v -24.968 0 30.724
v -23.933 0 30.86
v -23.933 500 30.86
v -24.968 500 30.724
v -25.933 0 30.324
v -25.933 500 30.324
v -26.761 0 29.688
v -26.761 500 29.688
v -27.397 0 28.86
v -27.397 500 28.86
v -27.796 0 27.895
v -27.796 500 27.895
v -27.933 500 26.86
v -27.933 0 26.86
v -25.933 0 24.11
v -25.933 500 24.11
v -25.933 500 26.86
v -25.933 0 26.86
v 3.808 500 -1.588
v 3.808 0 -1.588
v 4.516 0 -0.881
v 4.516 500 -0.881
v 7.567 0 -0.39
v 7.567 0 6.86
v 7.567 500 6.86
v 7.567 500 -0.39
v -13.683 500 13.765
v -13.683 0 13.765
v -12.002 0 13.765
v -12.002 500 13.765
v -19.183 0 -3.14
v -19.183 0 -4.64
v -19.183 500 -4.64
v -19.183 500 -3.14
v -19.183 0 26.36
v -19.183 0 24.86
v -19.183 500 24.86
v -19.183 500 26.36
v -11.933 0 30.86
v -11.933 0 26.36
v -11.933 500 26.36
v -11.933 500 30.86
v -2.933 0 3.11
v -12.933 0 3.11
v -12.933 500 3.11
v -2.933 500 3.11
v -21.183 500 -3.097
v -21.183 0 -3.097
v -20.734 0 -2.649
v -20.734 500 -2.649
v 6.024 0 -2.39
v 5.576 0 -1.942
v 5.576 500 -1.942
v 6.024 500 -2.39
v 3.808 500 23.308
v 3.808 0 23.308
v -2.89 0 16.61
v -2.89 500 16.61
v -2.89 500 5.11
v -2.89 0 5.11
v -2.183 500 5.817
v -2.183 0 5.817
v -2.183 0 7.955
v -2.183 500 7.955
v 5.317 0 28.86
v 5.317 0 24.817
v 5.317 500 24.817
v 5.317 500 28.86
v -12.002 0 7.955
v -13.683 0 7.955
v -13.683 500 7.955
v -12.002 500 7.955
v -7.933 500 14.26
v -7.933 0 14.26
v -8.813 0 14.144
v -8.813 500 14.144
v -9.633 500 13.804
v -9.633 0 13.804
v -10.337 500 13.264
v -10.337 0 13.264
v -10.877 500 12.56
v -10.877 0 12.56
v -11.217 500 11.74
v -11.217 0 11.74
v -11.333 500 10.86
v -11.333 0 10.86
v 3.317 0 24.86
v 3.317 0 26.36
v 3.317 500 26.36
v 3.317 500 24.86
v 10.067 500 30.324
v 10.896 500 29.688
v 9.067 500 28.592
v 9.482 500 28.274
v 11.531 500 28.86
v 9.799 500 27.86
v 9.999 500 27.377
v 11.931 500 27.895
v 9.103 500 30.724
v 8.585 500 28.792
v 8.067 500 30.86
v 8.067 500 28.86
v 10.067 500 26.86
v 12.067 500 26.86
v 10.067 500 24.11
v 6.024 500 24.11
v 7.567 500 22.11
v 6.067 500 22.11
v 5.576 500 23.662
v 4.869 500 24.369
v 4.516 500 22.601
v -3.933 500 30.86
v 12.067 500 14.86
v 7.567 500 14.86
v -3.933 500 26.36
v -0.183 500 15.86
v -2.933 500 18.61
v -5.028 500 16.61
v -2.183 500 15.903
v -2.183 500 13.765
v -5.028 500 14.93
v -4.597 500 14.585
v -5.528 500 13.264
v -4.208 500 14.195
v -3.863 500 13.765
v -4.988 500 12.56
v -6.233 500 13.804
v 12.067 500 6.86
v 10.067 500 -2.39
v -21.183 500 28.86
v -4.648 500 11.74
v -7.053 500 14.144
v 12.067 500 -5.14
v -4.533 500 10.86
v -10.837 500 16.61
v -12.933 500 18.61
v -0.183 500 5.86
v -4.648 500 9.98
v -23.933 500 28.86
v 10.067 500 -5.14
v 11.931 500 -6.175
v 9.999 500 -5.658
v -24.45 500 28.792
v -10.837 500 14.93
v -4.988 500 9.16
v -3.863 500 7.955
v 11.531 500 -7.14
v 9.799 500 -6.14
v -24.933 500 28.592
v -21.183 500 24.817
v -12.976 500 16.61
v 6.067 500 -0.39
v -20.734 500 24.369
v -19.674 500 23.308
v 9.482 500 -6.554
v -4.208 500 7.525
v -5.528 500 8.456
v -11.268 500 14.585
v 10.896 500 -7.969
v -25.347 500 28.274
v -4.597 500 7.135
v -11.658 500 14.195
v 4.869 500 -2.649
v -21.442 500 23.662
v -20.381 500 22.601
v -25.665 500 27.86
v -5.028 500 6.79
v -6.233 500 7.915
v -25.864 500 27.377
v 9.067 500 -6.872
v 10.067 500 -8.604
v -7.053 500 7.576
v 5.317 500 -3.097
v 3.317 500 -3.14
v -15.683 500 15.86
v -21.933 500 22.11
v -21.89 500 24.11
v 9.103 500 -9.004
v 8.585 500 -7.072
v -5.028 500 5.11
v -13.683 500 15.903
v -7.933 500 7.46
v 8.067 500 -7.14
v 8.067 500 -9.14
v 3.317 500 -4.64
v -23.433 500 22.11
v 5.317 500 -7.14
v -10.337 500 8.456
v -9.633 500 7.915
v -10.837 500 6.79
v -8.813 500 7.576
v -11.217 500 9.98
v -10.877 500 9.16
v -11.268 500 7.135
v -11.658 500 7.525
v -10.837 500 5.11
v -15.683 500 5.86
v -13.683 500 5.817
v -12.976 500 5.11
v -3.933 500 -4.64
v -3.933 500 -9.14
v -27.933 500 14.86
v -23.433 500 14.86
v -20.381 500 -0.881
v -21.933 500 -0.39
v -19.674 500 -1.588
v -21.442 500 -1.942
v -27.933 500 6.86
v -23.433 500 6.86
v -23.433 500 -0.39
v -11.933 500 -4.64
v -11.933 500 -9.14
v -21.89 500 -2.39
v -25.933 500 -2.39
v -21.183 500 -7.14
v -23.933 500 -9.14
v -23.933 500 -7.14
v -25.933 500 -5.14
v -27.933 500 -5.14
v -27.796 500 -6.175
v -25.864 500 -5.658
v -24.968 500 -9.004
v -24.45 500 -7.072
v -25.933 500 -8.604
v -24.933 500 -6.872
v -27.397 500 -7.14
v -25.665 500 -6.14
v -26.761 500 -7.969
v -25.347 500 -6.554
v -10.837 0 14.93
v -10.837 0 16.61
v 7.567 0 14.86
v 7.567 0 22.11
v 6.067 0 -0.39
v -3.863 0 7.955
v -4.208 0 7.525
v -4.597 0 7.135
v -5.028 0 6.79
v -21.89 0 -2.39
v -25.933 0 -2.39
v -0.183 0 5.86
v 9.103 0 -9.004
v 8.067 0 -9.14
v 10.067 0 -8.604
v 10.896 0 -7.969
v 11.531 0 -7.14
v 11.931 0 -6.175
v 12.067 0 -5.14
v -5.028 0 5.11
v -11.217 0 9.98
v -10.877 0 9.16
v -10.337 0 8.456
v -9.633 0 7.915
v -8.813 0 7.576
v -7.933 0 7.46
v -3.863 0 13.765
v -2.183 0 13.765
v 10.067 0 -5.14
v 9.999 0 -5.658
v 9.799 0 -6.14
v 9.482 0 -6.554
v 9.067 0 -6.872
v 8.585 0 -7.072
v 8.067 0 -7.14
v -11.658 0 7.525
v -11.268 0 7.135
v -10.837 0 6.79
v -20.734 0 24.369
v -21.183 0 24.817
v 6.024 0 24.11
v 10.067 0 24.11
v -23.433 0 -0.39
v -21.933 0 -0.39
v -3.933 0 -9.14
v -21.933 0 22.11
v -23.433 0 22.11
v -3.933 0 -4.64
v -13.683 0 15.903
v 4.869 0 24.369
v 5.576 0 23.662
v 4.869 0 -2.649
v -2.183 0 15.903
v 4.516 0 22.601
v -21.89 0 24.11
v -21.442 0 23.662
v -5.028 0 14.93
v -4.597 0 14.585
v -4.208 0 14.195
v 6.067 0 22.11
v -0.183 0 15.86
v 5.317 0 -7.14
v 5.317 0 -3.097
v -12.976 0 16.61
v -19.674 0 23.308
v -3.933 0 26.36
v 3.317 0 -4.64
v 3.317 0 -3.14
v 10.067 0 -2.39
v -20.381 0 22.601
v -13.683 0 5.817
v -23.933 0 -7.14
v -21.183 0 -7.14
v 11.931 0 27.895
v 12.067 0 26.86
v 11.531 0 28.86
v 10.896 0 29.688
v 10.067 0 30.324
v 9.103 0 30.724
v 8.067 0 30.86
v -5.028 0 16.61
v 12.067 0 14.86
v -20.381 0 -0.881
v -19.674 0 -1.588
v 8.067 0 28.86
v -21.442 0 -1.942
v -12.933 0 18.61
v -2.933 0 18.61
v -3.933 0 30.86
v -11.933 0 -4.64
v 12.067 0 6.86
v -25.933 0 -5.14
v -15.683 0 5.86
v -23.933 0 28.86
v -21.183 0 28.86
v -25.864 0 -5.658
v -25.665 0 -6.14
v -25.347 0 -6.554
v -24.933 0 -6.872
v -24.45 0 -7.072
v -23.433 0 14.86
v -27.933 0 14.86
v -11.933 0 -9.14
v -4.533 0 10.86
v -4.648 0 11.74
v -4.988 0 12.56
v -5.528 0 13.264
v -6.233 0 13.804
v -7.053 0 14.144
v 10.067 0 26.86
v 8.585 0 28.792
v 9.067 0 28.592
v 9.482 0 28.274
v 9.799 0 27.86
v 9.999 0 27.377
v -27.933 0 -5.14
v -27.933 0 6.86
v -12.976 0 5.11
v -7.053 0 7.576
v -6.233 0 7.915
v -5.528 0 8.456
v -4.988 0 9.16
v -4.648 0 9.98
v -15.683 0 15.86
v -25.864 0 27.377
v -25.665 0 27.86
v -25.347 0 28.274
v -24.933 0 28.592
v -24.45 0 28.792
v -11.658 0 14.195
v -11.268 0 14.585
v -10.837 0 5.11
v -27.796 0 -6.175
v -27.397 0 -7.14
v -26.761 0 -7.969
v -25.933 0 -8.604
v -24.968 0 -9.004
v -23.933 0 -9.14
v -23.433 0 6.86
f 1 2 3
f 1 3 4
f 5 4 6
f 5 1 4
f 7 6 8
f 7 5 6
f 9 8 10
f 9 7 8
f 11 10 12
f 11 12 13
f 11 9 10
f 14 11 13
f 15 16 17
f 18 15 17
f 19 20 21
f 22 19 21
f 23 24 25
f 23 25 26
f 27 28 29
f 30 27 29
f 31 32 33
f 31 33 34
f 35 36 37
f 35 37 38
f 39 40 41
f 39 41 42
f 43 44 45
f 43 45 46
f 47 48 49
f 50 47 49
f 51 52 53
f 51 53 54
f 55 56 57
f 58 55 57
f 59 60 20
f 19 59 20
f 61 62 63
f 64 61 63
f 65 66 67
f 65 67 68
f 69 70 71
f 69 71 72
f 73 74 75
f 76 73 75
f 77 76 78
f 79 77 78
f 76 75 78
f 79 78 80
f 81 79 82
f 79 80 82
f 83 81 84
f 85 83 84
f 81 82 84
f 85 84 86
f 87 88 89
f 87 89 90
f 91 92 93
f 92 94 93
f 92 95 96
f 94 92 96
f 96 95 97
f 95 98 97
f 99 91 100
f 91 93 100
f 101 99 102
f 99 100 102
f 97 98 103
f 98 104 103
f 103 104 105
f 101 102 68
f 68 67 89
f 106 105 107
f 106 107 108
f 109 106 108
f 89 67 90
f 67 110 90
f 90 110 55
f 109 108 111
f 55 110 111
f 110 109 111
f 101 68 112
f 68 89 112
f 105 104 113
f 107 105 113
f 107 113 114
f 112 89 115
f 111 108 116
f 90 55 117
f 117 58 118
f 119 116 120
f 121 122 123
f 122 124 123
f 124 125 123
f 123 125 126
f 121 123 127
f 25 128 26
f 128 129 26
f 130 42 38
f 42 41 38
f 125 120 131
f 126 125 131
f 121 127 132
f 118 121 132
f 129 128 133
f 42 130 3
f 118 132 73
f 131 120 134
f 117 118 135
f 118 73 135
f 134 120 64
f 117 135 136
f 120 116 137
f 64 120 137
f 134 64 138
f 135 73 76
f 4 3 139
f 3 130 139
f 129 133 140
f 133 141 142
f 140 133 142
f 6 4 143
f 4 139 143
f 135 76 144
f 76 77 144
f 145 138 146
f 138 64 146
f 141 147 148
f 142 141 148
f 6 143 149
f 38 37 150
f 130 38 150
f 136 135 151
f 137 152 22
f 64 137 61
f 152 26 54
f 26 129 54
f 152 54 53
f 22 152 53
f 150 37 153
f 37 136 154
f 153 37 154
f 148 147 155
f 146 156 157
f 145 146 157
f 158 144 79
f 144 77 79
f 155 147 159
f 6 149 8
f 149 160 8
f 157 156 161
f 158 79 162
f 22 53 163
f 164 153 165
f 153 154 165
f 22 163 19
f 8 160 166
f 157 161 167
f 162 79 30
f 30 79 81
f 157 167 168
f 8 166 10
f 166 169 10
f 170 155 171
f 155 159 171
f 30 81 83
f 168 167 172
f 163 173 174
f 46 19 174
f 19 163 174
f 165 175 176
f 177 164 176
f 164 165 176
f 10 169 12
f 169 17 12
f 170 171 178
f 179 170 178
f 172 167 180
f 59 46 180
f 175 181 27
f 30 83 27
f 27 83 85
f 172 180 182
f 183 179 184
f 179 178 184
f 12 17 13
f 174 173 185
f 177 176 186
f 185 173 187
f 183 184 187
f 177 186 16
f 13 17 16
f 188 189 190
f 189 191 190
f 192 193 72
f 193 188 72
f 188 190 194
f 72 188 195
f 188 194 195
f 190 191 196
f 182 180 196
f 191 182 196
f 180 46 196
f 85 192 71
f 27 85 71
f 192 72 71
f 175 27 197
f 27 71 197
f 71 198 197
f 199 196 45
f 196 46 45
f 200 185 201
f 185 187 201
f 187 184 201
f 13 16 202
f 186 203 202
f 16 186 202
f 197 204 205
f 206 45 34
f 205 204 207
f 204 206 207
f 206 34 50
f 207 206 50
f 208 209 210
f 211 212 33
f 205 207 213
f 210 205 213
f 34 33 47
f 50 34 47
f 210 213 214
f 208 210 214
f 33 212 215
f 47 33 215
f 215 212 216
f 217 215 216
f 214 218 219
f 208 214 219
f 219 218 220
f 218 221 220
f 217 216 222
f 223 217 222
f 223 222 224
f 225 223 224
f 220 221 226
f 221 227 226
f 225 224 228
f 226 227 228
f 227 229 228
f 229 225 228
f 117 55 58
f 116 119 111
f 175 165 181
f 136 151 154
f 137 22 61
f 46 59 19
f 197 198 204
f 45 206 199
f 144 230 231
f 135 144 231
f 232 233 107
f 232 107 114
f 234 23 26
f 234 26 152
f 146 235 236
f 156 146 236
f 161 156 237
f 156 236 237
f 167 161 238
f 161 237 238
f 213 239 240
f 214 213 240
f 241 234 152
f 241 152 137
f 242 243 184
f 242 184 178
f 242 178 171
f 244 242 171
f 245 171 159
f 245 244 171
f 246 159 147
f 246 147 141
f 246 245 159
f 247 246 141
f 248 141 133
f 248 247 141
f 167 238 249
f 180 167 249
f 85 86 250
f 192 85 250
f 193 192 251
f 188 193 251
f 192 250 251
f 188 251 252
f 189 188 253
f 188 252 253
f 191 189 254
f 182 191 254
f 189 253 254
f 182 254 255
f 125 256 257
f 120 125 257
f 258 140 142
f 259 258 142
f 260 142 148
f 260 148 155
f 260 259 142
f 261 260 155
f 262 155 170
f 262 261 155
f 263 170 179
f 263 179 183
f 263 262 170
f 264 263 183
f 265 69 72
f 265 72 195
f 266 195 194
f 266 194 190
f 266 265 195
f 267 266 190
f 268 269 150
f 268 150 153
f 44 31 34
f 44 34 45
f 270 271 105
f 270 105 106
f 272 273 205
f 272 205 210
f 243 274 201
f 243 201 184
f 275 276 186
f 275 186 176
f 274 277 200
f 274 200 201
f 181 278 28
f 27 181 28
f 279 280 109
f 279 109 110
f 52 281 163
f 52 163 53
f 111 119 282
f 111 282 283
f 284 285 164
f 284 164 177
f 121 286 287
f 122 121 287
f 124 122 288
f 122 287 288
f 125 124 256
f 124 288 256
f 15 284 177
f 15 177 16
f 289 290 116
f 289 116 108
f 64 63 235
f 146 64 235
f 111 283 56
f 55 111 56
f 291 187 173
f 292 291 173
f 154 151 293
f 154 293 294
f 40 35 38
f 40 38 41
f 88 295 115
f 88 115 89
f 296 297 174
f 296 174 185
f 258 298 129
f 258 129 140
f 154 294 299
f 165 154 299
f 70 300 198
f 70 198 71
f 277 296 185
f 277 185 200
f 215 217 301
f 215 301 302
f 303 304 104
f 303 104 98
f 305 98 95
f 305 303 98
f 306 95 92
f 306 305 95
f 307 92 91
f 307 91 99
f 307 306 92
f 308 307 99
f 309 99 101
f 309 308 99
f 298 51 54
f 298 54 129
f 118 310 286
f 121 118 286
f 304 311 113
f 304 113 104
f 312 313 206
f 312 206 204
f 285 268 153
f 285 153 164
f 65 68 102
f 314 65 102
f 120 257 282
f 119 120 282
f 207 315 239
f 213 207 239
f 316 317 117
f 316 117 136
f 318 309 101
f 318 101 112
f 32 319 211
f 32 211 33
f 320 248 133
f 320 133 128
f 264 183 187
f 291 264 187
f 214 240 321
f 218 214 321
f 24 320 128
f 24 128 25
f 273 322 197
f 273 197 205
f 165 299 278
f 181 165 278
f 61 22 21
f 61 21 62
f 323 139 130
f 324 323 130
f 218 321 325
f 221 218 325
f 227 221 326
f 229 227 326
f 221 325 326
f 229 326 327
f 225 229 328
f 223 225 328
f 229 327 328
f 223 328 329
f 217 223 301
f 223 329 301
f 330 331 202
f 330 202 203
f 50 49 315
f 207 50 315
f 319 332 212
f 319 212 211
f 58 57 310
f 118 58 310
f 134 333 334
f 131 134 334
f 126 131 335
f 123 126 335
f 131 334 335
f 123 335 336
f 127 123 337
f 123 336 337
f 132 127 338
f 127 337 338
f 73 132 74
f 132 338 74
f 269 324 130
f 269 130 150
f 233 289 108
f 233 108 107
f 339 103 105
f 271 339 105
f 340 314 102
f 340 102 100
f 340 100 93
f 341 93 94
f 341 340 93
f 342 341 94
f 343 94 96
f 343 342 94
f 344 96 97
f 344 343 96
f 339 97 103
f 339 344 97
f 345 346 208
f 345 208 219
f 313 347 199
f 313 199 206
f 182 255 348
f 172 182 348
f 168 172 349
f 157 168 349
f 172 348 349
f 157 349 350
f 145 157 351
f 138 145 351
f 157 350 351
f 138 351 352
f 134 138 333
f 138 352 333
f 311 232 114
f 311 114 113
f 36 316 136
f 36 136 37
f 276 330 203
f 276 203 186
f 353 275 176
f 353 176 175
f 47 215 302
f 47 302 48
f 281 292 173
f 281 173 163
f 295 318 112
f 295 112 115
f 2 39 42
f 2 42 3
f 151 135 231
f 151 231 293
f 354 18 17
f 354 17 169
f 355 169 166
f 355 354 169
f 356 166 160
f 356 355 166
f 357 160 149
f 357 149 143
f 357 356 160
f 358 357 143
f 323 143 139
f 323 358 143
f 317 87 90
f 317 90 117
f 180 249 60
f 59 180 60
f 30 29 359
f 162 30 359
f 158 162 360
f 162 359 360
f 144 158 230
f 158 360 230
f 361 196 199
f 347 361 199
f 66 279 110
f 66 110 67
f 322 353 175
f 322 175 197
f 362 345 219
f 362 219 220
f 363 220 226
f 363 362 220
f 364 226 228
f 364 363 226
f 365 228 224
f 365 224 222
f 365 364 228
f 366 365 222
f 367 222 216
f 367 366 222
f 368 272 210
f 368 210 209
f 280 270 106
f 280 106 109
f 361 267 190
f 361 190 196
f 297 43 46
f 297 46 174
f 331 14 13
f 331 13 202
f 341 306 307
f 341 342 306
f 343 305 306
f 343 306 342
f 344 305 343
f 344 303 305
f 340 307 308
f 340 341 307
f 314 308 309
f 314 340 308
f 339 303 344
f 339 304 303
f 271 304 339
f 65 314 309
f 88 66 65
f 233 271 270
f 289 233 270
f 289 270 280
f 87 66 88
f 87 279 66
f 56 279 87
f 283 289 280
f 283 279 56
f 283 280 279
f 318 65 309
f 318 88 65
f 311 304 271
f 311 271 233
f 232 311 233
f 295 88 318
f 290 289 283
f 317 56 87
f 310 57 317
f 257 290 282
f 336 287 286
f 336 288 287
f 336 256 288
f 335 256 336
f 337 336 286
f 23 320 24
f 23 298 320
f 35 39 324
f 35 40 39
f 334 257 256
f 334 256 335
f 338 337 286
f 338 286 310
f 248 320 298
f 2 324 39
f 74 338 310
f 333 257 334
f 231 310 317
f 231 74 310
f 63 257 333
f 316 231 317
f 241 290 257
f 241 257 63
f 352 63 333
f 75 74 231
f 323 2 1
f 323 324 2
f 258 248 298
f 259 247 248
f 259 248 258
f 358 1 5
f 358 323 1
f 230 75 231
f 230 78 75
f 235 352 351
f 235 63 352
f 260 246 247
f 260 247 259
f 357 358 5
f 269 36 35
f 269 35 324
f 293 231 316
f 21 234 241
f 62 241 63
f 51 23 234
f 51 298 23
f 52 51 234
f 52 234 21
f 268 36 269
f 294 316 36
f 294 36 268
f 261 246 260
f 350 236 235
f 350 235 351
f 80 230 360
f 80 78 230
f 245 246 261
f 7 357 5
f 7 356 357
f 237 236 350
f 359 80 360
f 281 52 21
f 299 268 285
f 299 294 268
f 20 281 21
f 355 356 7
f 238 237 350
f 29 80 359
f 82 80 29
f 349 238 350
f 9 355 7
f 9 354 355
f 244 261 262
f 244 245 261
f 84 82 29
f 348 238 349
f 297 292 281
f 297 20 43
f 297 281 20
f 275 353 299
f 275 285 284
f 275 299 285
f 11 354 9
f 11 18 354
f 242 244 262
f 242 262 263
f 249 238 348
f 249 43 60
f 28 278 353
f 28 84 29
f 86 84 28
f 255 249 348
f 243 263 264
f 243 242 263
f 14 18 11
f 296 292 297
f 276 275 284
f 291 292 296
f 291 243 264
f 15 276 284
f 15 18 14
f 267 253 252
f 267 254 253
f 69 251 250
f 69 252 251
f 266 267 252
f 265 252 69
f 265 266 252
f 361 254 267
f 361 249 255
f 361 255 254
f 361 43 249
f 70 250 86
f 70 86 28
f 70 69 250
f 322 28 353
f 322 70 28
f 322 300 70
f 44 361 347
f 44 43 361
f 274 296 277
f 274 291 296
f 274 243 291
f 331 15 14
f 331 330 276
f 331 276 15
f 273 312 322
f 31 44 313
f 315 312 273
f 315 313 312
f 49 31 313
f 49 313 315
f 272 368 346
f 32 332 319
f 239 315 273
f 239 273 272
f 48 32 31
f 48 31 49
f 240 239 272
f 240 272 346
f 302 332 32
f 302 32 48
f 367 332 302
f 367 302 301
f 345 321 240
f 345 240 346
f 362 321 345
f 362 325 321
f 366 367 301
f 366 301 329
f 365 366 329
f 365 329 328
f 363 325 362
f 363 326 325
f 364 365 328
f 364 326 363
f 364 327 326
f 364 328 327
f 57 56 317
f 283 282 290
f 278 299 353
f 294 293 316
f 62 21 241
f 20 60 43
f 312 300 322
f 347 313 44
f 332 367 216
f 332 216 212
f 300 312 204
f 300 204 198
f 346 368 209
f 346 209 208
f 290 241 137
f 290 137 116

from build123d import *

# Parameters (mm, degrees)
BOSS_EXTRUDE1_DEPTH = 500


with BuildPart() as part:
    # Sketch1 → Boss-Extrude1 (new body)
    with BuildSketch(Plane(origin=(0, 0, 0), x_dir=(1, 0, 0), z_dir=(0, 1, 0))):
        with BuildLine():
            Line((-27.932618907, -6.859852703), (-27.932618907, 5.140147297))
            ThreePointArc((-27.932618907, 5.140147297), (-26.761046031, 7.968574422), (-23.932618907, 9.140147297))
            Line((-23.932618907, 9.140147297), (-11.932618907, 9.140147297))
            Line((-11.932618907, 9.140147297), (-11.932618907, 4.640147297))
            Line((-11.932618907, 4.640147297), (-19.182618907, 4.640147297))
            Line((-19.182618907, 4.640147297), (-19.182618907, 3.140147297))
            Line((-19.182618907, 3.140147297), (-12.932618907, -3.109852703))
            Line((-12.932618907, -3.109852703), (-7.932618907, -3.109852703))
            Line((-7.932618907, -3.109852703), (-2.932618907, -3.109852703))
            Line((-2.932618907, -3.109852703), (3.317381093, 3.140147297))
            Line((3.317381093, 3.140147297), (3.317381093, 4.640147297))
            Line((3.317381093, 4.640147297), (-3.932618907, 4.640147297))
            Line((-3.932618907, 4.640147297), (-3.932618907, 9.140147297))
            Line((-3.932618907, 9.140147297), (8.067381093, 9.140147297))
            ThreePointArc((8.067381093, 9.140147297), (10.895808218, 7.968574422), (12.067381093, 5.140147297))
            Line((12.067381093, 5.140147297), (12.067381093, -6.859852703))
            Line((12.067381093, -6.859852703), (7.567381093, -6.859852703))
            Line((7.567381093, -6.859852703), (7.567381093, 0.390147297))
            Line((7.567381093, 0.390147297), (6.067381093, 0.390147297))
            Line((6.067381093, 0.390147297), (-0.182618907, -5.859852703))
            Line((-0.182618907, -5.859852703), (-0.182618907, -10.859852703))
            Line((-0.182618907, -10.859852703), (-0.182618907, -15.859852703))
            Line((-0.182618907, -15.859852703), (6.067381093, -22.109852703))
            Line((6.067381093, -22.109852703), (7.567381093, -22.109852703))
            Line((7.567381093, -22.109852703), (7.567381093, -14.859852703))
            Line((7.567381093, -14.859852703), (12.067381093, -14.859852703))
            Line((12.067381093, -14.859852703), (12.067381093, -26.859852703))
            ThreePointArc((12.067381093, -26.859852703), (10.895808218, -29.688279827), (8.067381093, -30.859852703))
            Line((8.067381093, -30.859852703), (-3.932618907, -30.859852703))
            Line((-3.932618907, -30.859852703), (-3.932618907, -26.359852703))
            Line((-3.932618907, -26.359852703), (3.317381093, -26.359852703))
            Line((3.317381093, -26.359852703), (3.317381093, -24.859852703))
            Line((3.317381093, -24.859852703), (-2.932618907, -18.609852703))
            Line((-2.932618907, -18.609852703), (-7.932618907, -18.609852703))
            Line((-7.932618907, -18.609852703), (-12.932618907, -18.609852703))
            Line((-12.932618907, -18.609852703), (-19.182618907, -24.859852703))
            Line((-19.182618907, -24.859852703), (-19.182618907, -26.359852703))
            Line((-19.182618907, -26.359852703), (-11.932618907, -26.359852703))
            Line((-11.932618907, -26.359852703), (-11.932618907, -30.859852703))
            Line((-11.932618907, -30.859852703), (-23.932618907, -30.859852703))
            ThreePointArc((-23.932618907, -30.859852703), (-26.761046031, -29.688279827), (-27.932618907, -26.859852703))
            Line((-27.932618907, -26.859852703), (-27.932618907, -14.859852703))
            Line((-27.932618907, -14.859852703), (-23.432618907, -14.859852703))
            Line((-23.432618907, -14.859852703), (-23.432618907, -22.109852703))
            Line((-23.432618907, -22.109852703), (-21.932618907, -22.109852703))
            Line((-21.932618907, -22.109852703), (-15.682618907, -15.859852703))
            Line((-15.682618907, -15.859852703), (-15.682618907, -10.859852703))
            Line((-15.682618907, -10.859852703), (-15.682618907, -5.859852703))
            Line((-15.682618907, -5.859852703), (-21.932618907, 0.390147297))
            Line((-21.932618907, 0.390147297), (-23.432618907, 0.390147297))
            Line((-23.432618907, 0.390147297), (-23.432618907, -6.859852703))
            Line((-23.432618907, -6.859852703), (-27.932618907, -6.859852703))
        make_face()
        with BuildLine():
            Line((-25.932618907, 2.390147297), (-25.932618907, 5.140147297))
            ThreePointArc((-25.932618907, 5.140147297), (-25.346832469, 6.55436086), (-23.932618907, 7.140147297))
            Line((-23.932618907, 7.140147297), (-21.182618907, 7.140147297))
            Line((-21.182618907, 7.140147297), (-21.182618907, 3.097254079))
            Line((-21.182618907, 3.097254079), (-20.734395602, 2.649030774))
            Line((-20.734395602, 2.649030774), (-21.441502383, 1.941923993))
            Line((-21.441502383, 1.941923993), (-21.889725688, 2.390147297))
            Line((-21.889725688, 2.390147297), (-25.932618907, 2.390147297))
        make_face(mode=Mode.SUBTRACT)
        with BuildLine():
            Line((-20.380842211, 0.881263821), (-13.682618907, -5.816959484))
            Line((-13.682618907, -5.816959484), (-13.682618907, -7.955115193))
            Line((-13.682618907, -7.955115193), (-13.182618907, -7.955115193))
            Line((-13.182618907, -7.955115193), (-12.002324056, -7.955115193))
            ThreePointArc((-12.002324056, -7.955115193), (-11.468152813, -7.324318797), (-10.837356416, -6.790147554))
            Line((-10.837356416, -6.790147554), (-10.837356416, -5.609852703))
            Line((-10.837356416, -5.609852703), (-10.837356416, -5.109852703))
            Line((-10.837356416, -5.109852703), (-12.975512126, -5.109852703))
            Line((-12.975512126, -5.109852703), (-19.67373543, 1.588370602))
            Line((-19.67373543, 1.588370602), (-20.380842211, 0.881263821))
        make_face(mode=Mode.SUBTRACT)
        with BuildLine():
            Line((10.067381093, 2.390147297), (10.067381093, 5.140147297))
            ThreePointArc((10.067381093, 5.140147297), (9.481594656, 6.55436086), (8.067381093, 7.140147297))
            Line((8.067381093, 7.140147297), (5.317381093, 7.140147297))
            Line((5.317381093, 7.140147297), (5.317381093, 3.097254079))
            Line((5.317381093, 3.097254079), (4.869157789, 2.649030774))
            Line((4.869157789, 2.649030774), (5.57626457, 1.941923993))
            Line((5.57626457, 1.941923993), (6.024487874, 2.390147297))
            Line((6.024487874, 2.390147297), (10.067381093, 2.390147297))
        make_face(mode=Mode.SUBTRACT)
        with BuildLine():
            Line((-2.182618907, -5.816959484), (-2.182618907, -7.955115193))
            Line((-2.182618907, -7.955115193), (-2.682618907, -7.955115193))
            Line((-2.682618907, -7.955115193), (-3.862913758, -7.955115193))
            ThreePointArc((-3.862913758, -7.955115193), (-4.397085001, -7.324318797), (-5.027881397, -6.790147554))
            Line((-5.027881397, -6.790147554), (-5.027881397, -5.609852703))
            Line((-5.027881397, -5.609852703), (-5.027881397, -5.109852703))
            Line((-5.027881397, -5.109852703), (-2.889725688, -5.109852703))
            Line((-2.889725688, -5.109852703), (3.808497617, 1.588370602))
            Line((3.808497617, 1.588370602), (4.515604398, 0.881263821))
            Line((4.515604398, 0.881263821), (-2.182618907, -5.816959484))
        make_face(mode=Mode.SUBTRACT)
        with BuildLine():
            Line((5.317381093, -28.859852703), (8.067381093, -28.859852703))
            ThreePointArc((8.067381093, -28.859852703), (9.481594656, -28.274066265), (10.067381093, -26.859852703))
            Line((10.067381093, -26.859852703), (10.067381093, -24.109852703))
            Line((10.067381093, -24.109852703), (6.024487874, -24.109852703))
            Line((6.024487874, -24.109852703), (5.57626457, -23.661629398))
            Line((5.57626457, -23.661629398), (4.869157789, -24.368736179))
            Line((4.869157789, -24.368736179), (5.317381093, -24.816959484))
            Line((5.317381093, -24.816959484), (5.317381093, -28.859852703))
        make_face(mode=Mode.SUBTRACT)
        with BuildLine():
            Line((-2.889725688, -16.609852703), (-5.027881397, -16.609852703))
            Line((-5.027881397, -16.609852703), (-5.027881397, -16.109852703))
            Line((-5.027881397, -16.109852703), (-5.027881397, -14.929557852))
            ThreePointArc((-5.027881397, -14.929557852), (-4.397085001, -14.395386609), (-3.862913758, -13.764590212))
            Line((-3.862913758, -13.764590212), (-2.682618907, -13.764590212))
            Line((-2.682618907, -13.764590212), (-2.182618907, -13.764590212))
            Line((-2.182618907, -13.764590212), (-2.182618907, -15.902745921))
            Line((-2.182618907, -15.902745921), (4.515604398, -22.600969226))
            Line((4.515604398, -22.600969226), (3.808497617, -23.308076007))
            Line((3.808497617, -23.308076007), (-2.889725688, -16.609852703))
        make_face(mode=Mode.SUBTRACT)
        with BuildLine():
            Line((-25.932618907, -24.109852703), (-25.932618907, -26.859852703))
            ThreePointArc((-25.932618907, -26.859852703), (-25.346832469, -28.274066265), (-23.932618907, -28.859852703))
            Line((-23.932618907, -28.859852703), (-21.182618907, -28.859852703))
            Line((-21.182618907, -28.859852703), (-21.182618907, -24.816959484))
            Line((-21.182618907, -24.816959484), (-20.734395602, -24.368736179))
            Line((-20.734395602, -24.368736179), (-21.441502383, -23.661629398))
            Line((-21.441502383, -23.661629398), (-21.889725688, -24.109852703))
            Line((-21.889725688, -24.109852703), (-25.932618907, -24.109852703))
        make_face(mode=Mode.SUBTRACT)
        with BuildLine():
            Line((-13.682618907, -15.902745921), (-13.682618907, -13.764590212))
            Line((-13.682618907, -13.764590212), (-13.182618907, -13.764590212))
            Line((-13.182618907, -13.764590212), (-12.002324056, -13.764590212))
            ThreePointArc((-12.002324056, -13.764590212), (-11.468152813, -14.395386609), (-10.837356416, -14.929557852))
            Line((-10.837356416, -14.929557852), (-10.837356416, -16.109852703))
            Line((-10.837356416, -16.109852703), (-10.837356416, -16.609852703))
            Line((-10.837356416, -16.609852703), (-12.975512126, -16.609852703))
            Line((-12.975512126, -16.609852703), (-19.67373543, -23.308076007))
            Line((-19.67373543, -23.308076007), (-20.380842211, -22.600969226))
            Line((-20.380842211, -22.600969226), (-13.682618907, -15.902745921))
        make_face(mode=Mode.SUBTRACT)
        with BuildLine():
            ThreePointArc((-11.332618907, -10.859852703), (-10.336781963, -8.455689647), (-7.932618907, -7.459852703))
            ThreePointArc((-7.932618907, -7.459852703), (-5.528455851, -8.455689647), (-4.532618907, -10.859852703))
            ThreePointArc((-4.532618907, -10.859852703), (-5.528455851, -13.264015759), (-7.932618907, -14.259852703))
            ThreePointArc((-7.932618907, -14.259852703), (-10.336781963, -13.264015759), (-11.332618907, -10.859852703))
        make_face(mode=Mode.SUBTRACT)
    extrude(amount=BOSS_EXTRUDE1_DEPTH)


solid = part.part
